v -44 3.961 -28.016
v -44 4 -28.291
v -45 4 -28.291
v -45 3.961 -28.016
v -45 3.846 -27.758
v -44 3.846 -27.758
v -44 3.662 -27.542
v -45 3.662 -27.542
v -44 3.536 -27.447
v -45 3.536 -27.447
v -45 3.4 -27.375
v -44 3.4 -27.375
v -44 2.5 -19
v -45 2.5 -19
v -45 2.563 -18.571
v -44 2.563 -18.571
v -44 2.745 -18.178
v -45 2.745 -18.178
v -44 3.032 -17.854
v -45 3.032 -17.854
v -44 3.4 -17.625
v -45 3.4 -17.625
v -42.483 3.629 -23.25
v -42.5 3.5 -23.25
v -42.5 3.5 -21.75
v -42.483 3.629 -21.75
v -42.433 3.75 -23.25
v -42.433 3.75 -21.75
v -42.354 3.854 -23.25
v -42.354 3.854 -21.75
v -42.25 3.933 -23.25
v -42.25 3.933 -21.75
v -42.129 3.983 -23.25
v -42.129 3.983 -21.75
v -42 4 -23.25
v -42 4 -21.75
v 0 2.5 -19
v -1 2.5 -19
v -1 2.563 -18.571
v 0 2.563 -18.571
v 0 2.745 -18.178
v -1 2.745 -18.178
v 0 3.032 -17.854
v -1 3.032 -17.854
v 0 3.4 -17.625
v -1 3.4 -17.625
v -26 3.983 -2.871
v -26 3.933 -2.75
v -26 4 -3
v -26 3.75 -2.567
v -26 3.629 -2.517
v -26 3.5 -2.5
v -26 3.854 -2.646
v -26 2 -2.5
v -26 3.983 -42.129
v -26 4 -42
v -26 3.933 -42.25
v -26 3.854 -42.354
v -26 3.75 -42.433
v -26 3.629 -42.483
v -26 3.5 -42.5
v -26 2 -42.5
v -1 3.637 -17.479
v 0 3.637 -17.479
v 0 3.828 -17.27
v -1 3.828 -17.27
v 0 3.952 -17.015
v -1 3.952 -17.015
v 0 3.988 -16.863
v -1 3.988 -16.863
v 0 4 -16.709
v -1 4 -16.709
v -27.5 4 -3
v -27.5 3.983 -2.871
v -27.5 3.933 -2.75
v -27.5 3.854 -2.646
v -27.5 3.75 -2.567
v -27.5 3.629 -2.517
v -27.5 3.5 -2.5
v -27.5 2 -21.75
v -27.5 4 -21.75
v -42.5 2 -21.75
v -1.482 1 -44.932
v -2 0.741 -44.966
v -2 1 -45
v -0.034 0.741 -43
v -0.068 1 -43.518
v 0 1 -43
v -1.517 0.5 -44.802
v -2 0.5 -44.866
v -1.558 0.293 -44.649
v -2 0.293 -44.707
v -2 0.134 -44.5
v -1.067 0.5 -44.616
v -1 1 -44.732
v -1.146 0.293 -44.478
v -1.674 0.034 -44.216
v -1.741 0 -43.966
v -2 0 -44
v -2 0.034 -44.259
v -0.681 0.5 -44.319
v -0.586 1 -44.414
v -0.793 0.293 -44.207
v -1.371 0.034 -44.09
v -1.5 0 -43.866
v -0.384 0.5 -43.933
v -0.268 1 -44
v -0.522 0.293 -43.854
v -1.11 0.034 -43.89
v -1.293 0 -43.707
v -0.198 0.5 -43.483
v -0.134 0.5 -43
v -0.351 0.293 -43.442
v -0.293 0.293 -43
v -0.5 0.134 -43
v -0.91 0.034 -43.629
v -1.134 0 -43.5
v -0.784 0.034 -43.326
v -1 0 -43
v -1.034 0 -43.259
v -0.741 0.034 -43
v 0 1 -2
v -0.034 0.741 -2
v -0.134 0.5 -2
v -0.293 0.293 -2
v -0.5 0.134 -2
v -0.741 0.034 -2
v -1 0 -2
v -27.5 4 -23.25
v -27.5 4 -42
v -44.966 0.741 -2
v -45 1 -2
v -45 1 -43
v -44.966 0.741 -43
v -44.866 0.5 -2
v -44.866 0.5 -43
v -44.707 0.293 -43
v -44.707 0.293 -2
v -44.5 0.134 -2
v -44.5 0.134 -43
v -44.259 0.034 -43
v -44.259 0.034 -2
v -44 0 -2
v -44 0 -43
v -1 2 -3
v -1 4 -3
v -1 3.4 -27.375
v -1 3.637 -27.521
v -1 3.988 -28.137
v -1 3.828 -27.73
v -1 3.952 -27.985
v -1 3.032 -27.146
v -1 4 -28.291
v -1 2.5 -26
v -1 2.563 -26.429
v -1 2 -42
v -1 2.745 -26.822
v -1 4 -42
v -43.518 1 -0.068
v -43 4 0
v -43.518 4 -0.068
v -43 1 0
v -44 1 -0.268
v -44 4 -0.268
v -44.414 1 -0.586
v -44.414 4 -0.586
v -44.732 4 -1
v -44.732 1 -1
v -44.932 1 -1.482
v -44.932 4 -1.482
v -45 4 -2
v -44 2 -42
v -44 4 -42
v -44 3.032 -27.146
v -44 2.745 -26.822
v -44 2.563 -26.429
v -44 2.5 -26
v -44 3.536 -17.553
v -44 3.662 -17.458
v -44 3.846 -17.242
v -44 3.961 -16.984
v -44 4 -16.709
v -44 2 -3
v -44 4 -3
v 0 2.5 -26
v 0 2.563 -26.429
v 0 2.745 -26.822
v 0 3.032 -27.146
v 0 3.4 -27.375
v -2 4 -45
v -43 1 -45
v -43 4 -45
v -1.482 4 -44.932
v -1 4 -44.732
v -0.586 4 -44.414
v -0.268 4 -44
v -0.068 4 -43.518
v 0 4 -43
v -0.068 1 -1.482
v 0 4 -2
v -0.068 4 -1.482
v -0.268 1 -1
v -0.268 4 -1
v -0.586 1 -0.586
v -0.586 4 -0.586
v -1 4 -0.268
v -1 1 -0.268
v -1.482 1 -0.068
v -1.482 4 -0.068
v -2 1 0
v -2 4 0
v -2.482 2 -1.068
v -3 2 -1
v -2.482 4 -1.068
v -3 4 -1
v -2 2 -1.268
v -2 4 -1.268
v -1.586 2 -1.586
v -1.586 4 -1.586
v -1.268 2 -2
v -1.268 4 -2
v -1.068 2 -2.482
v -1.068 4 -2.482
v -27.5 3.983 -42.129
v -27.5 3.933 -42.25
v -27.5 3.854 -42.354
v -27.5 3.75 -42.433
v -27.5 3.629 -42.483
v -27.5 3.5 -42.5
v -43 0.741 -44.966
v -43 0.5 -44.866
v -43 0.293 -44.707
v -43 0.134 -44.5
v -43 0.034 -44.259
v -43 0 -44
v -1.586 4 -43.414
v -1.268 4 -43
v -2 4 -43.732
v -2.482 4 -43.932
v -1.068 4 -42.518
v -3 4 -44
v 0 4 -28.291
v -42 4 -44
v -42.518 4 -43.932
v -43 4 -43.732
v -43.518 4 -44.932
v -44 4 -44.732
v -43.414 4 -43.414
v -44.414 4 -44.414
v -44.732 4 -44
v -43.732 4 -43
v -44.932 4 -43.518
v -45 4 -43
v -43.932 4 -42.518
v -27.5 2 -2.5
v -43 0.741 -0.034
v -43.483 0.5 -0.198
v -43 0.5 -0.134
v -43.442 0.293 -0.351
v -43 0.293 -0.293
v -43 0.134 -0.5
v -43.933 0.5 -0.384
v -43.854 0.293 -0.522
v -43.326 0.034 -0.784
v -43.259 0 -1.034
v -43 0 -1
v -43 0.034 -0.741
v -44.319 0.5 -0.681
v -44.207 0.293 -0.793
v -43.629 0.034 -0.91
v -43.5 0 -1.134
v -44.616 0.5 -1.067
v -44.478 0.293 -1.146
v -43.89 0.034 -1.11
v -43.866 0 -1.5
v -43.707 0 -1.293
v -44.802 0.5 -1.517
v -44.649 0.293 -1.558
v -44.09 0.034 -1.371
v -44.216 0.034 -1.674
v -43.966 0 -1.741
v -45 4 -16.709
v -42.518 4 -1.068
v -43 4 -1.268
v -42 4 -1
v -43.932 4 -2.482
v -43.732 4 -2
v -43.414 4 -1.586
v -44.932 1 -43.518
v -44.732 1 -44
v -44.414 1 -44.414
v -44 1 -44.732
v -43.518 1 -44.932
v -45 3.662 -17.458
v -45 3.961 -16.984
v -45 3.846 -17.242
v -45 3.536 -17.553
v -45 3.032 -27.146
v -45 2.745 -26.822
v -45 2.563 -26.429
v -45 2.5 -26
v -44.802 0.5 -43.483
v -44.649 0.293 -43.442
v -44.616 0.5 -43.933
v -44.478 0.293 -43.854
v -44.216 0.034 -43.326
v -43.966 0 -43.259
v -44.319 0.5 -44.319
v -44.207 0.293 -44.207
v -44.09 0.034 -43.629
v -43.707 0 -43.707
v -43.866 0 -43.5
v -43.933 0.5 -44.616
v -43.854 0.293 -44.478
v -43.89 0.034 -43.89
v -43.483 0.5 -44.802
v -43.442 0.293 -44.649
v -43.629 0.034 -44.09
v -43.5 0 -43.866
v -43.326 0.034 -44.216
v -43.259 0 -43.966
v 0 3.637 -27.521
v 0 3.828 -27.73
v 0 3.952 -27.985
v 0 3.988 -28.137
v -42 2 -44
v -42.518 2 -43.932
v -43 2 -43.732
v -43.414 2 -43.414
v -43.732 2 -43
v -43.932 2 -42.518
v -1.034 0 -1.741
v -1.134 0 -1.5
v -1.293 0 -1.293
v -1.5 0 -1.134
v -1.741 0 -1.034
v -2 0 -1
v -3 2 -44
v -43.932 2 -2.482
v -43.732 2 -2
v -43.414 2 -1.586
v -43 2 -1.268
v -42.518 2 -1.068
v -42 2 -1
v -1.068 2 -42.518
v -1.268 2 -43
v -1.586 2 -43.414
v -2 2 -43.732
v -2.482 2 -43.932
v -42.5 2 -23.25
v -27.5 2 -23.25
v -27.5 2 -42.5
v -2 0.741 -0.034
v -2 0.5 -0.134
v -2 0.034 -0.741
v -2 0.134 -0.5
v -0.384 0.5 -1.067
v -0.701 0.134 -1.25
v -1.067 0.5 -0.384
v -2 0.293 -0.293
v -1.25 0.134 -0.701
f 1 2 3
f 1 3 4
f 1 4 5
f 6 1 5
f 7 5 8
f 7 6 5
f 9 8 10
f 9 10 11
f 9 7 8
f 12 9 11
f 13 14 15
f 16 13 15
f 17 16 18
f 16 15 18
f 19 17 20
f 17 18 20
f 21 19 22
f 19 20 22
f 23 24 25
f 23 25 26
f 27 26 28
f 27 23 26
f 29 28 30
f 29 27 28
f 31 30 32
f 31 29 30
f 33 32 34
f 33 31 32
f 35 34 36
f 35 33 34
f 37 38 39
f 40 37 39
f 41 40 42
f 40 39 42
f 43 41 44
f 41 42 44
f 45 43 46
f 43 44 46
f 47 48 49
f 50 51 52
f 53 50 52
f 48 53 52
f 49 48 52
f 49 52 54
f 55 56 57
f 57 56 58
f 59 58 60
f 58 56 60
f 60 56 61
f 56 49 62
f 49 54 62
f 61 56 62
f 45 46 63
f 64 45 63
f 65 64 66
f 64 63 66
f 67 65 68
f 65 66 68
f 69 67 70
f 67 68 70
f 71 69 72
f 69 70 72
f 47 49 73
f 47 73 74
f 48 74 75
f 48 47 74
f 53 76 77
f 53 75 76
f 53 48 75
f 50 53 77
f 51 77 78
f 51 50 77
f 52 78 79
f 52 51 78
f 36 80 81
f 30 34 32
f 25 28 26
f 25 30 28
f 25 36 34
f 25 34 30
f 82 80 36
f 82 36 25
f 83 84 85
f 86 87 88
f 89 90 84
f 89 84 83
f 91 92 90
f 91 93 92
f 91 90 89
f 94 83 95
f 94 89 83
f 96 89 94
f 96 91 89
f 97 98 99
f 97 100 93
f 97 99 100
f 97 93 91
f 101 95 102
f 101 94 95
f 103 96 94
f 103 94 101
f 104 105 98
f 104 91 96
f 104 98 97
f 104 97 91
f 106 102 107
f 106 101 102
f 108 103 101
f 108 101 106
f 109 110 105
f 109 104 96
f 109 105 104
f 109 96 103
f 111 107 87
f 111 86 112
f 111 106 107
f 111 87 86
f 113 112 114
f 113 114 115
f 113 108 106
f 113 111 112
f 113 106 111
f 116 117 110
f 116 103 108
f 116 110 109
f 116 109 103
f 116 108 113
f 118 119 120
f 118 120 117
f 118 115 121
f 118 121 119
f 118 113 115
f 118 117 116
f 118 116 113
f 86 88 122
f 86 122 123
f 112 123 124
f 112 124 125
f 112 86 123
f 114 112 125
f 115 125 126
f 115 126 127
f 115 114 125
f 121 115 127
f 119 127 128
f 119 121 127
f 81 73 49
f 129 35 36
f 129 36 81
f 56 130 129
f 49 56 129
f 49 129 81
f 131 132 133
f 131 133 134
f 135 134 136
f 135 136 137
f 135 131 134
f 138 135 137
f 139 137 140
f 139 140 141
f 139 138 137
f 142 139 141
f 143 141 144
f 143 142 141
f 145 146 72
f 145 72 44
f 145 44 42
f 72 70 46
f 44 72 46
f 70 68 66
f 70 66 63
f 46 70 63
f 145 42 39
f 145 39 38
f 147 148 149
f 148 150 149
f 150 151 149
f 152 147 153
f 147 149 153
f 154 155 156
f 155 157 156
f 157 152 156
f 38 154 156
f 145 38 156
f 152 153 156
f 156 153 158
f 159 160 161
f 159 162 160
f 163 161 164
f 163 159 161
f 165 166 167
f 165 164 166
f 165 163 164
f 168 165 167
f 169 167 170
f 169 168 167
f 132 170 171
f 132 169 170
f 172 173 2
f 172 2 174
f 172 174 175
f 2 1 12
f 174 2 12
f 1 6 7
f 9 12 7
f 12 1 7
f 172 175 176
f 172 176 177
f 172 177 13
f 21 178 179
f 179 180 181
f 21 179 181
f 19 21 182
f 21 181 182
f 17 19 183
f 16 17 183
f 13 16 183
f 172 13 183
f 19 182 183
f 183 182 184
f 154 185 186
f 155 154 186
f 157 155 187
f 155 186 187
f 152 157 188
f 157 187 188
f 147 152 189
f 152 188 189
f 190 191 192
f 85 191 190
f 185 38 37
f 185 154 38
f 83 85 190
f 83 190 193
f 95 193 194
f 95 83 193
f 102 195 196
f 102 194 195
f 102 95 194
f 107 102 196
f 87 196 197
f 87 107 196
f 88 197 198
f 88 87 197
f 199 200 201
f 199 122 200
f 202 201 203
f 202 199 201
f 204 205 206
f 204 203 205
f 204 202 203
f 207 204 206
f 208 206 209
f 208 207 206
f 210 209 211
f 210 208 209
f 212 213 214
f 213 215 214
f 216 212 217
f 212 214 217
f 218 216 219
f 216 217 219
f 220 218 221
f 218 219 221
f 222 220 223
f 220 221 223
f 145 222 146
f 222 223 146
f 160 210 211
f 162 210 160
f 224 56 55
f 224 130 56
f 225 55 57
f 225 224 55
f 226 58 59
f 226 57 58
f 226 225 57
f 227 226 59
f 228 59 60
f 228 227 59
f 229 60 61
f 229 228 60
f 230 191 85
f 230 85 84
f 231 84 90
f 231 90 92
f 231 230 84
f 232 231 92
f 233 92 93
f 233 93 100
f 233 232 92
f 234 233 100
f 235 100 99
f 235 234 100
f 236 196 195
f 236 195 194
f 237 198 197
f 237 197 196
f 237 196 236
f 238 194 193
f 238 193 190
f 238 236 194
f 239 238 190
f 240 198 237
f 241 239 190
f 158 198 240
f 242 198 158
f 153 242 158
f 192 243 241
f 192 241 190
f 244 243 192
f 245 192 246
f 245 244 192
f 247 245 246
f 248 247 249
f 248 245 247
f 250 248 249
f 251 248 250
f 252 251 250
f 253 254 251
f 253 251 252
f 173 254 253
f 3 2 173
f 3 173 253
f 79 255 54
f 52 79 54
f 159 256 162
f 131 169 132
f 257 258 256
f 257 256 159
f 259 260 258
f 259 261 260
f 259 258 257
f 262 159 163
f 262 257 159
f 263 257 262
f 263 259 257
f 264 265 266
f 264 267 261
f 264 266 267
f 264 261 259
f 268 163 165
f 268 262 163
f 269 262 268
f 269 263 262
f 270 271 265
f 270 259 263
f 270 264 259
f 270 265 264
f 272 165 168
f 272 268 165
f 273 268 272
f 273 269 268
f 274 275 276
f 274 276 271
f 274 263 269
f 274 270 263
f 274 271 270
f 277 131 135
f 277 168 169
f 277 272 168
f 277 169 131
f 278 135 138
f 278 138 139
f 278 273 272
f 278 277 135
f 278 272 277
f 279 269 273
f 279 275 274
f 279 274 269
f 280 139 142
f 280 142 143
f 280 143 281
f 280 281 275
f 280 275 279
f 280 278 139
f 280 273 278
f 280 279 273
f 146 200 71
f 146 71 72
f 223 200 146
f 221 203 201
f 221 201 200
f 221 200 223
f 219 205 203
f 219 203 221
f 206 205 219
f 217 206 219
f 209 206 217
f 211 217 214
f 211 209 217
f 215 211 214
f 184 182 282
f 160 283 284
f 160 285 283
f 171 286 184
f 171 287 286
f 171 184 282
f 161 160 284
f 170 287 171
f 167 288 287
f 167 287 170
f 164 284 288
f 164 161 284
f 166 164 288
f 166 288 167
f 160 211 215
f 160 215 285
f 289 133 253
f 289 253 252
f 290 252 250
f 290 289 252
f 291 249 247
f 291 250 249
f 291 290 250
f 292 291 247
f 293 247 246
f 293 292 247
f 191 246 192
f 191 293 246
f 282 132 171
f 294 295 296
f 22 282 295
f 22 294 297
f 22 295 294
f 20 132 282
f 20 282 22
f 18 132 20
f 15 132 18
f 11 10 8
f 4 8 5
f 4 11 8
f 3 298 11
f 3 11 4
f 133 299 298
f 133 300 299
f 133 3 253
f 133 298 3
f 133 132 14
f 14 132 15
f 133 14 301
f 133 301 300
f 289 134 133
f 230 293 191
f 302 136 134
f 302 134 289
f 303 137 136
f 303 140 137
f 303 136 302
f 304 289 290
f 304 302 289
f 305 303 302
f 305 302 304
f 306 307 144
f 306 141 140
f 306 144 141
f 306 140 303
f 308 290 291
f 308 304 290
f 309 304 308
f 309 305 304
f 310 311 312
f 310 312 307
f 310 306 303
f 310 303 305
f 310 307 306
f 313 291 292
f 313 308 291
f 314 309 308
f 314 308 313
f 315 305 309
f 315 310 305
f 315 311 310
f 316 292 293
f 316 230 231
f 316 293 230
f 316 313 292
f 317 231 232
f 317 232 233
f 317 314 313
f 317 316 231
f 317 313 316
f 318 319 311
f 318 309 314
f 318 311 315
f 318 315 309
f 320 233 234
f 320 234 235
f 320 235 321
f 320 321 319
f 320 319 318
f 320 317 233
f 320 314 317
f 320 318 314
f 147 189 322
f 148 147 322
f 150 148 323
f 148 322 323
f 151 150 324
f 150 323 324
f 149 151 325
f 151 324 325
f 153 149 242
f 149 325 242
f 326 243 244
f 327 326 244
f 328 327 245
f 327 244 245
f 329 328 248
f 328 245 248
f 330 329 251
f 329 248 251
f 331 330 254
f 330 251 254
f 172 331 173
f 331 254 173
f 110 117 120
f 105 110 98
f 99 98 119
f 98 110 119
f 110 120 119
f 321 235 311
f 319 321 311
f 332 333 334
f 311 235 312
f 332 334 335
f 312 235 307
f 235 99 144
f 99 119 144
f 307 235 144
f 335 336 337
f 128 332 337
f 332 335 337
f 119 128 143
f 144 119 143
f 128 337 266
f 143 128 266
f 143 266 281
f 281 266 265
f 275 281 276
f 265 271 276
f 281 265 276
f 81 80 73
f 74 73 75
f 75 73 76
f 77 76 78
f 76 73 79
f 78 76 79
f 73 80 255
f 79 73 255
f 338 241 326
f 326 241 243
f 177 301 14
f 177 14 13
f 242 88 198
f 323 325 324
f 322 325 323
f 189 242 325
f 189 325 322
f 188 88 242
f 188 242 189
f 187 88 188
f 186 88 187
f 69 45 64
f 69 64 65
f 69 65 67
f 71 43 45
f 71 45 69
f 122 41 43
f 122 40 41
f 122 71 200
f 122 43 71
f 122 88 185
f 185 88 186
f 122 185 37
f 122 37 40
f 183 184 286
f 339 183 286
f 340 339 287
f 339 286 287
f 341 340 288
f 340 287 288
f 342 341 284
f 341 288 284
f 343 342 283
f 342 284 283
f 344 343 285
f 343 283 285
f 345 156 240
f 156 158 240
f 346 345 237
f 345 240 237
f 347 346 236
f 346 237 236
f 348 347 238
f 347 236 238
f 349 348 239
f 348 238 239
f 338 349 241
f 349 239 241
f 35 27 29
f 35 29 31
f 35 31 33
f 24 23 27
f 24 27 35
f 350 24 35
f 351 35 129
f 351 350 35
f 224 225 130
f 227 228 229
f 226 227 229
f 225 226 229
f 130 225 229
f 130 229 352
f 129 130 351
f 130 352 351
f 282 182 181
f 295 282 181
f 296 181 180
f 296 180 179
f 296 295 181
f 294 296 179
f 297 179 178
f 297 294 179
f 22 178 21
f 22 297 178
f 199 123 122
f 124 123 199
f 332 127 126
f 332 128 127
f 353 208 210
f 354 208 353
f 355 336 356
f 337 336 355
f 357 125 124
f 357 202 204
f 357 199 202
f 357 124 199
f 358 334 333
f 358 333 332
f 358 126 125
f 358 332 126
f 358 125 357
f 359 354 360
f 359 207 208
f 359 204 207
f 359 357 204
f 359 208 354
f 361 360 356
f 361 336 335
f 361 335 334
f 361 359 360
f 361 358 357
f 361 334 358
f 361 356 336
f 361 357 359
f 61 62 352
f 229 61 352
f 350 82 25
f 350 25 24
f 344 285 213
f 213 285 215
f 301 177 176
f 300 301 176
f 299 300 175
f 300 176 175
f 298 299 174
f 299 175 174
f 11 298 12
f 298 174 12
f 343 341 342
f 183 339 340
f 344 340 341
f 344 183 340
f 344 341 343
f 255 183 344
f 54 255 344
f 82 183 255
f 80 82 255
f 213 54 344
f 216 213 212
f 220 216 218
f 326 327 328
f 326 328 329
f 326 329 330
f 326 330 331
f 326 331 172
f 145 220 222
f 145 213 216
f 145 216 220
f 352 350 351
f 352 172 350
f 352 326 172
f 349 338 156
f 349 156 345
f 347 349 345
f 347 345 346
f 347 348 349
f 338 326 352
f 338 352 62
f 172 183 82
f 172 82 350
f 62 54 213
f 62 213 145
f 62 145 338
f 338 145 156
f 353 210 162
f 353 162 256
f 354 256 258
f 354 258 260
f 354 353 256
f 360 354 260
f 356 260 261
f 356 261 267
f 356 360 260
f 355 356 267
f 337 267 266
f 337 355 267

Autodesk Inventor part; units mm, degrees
ref_plane "YZ Plane" through (0, 0, 0) normal (1, 0, 0) x (0, 1, 0)
ref_plane "XZ Plane" through (0, 0, 0) normal (0, 1, 0) x (-1, 0, 0)
ref_plane "XY Plane" through (0, 0, 0) normal (0, 0, 1) x (1, 0, 0)
sketch "底面スケッチ" plane through (0, 0, 0) normal (0, 1, 0) x (-1, 0, 0)
  line L0 (2, 0) -> (43, 0)
  line L1 (45, -2) -> (45, -43)
  line L2 (43, -45) -> (2, -45)
  line L3 (0, -43) -> (0, -2)
  arc A0 (45, -2) -> (43, 0) centre (43, -2) ccw
  arc A1 (43, -45) -> (45, -43) centre (43, -43) ccw
  arc A2 (0, -43) -> (2, -45) centre (2, -43) ccw
  arc A3 (2, 0) -> (0, -2) centre (2, -2) ccw
  point P0 (0, 0)
  point P1 (45, -45)
  point P2 (45, 0)
  point P3 (0, -45)
  dimension "d0" = 45
  dimension "d1" = 45
  dimension "d4" = 2
extrude "押し出し1" add sketch "底面スケッチ" along normal blind 4
sketch "スケッチ2" plane through (0, 4, 0) normal (0, 1, 0) x (1, 0, 0)
  line L0 (-42, 1) -> (-3, 1)
  line L1 (-1, 3) -> (-1, 42)
  line L2 (-3, 44) -> (-42, 44)
  line L3 (-44, 42) -> (-44, 3)
  line L4 (-2, 45) -> (-43, 45) projected
  line L5 (-43, 0) -> (-2, 0) projected
  line L6 (-45, 43) -> (-45, 2) projected
  line L7 (0, 2) -> (0, 43) projected
  arc A0 (-44, 3) -> (-42, 1) centre (-42, 3) ccw
  arc A1 (-3, 1) -> (-1, 3) centre (-3, 3) ccw
  arc A2 (-42, 44) -> (-44, 42) centre (-42, 42) ccw
  arc A3 (-1, 42) -> (-3, 44) centre (-3, 42) ccw
  point P0 (0, 0)
  dimension "d5" = 1
  dimension "d6" = 1
  dimension "d7" = 1
  dimension "d8" = 1
  dimension "d9" = 2
extrude "押し出し2" cut sketch "スケッチ2" against normal blind 2
sketch "スケッチ3" plane through (0, 2, 0) normal (0, 1, 0) x (1, 0, 0)
  line L0 (-3, 1) -> (-42, 1) projected
  line L1 (-42, 44) -> (-3, 44) projected
  line L2 (-44, 3) -> (-44, 42) projected
  line L3 (-27.5, 2.5) -> (-26, 2.5)
  line L4 (-26, 2.5) -> (-26, 42.5)
  line L5 (-26, 42.5) -> (-27.5, 42.5)
  line L6 (-27.5, 42.5) -> (-27.5, 2.5)
  line L7 (-1, 42) -> (-1, 3) projected
  line L8 (-27.5, 21.75) -> (-42.5, 21.75)
  line L9 (-42.5, 21.75) -> (-42.5, 23.25)
  line L10 (-42.5, 23.25) -> (-27.5, 23.25)
  line L11 (-27.5, 23.25) -> (-27.5, 21.75)
  point P0 (0, 0)
  point P1 (-26, 22.5)
  point P2 (-1, 22.5)
  point P3 (-42.5, 22.5)
  point P4 (-1, 22.5)
  dimension "d19" = 1.5
  dimension "d20" = 40
  dimension "d21" = 16.5
  dimension "d22" = 1.5
  dimension "d23" = 15
extrude "押し出し3" add sketch "スケッチ3" along normal blind 2
fillet "フィレット1" radius 0.5 3 edges at (-26.75, 4, -42.5) (-26.75, 4, -2.5) (-42.5, 4, -22.5)
fillet "フィレット2" radius 1 8 edges at (-44.4142, 0, -44.4142) (-45, 0, -22.5) (-44.4142, 0, -0.5858) (-22.5, 0, 0) (-0.5858, 0, -0.5858) (0, 0, -22.5) (-0.5858, 0, -44.4142) (-22.5, 0, -45)
sketch "スケッチ4" plane through (0, 4, 0) normal (0, 1, 0) x (1, 0, 0)
  line L0 (-1, 42) -> (-1, 3) projected
  line L1 (-1, 27.5) -> (0, 27.5)
  line L2 (0, 27.5) -> (0, 17.5)
  line L3 (0, 17.5) -> (-1, 17.5)
  line L4 (-1, 17.5) -> (-1, 27.5)
  line L5 (0, 2) -> (0, 43) projected
  line L6 (-45, 2) -> (-45, 43) projected
  line L7 (-44, 43) -> (-44, 2) projected
  line L8 (-45, 27.5) -> (-44, 27.5)
  line L9 (-44, 27.5) -> (-44, 17.5)
  line L10 (-44, 17.5) -> (-45, 17.5)
  line L11 (-45, 17.5) -> (-45, 27.5)
  point P0 (0, 0)
  point P1 (0, 22.5)
  point P2 (0, 22.5)
  point P3 (-45, 22.5)
  point P4 (-44, 22.5)
  dimension "d24" = 10
  dimension "d25" = 10
extrude "押し出し4" cut sketch "スケッチ4" against normal blind 1.5
fillet "フィレット3" radius 1.5 4 edges at (-44.5, 2.5, -27.5) (-44.5, 2.5, -17.5) (-0.5, 2.5, -27.5) (-0.5, 2.5, -17.5)
fillet "フィレット4" radius 1 8 edges at (-0.5, 3.9995, -27.5) (-0.5, 4, -27.5) (-0.5, 3.9995, -17.5) (-0.5, 4, -17.5) (-44.5, 4, -27.5) (-44.5, 3.9995, -27.5) (-44.5, 4, -17.5) (-44.5, 3.9995, -17.5)
equation "\"d1\" = d0"
equation "\"d6\" = d5"
equation "\"d7\" = d5"
equation "\"d8\" = d5"
equation "\"d25\" = d24"
properties part number "box-2_3D プリント"
